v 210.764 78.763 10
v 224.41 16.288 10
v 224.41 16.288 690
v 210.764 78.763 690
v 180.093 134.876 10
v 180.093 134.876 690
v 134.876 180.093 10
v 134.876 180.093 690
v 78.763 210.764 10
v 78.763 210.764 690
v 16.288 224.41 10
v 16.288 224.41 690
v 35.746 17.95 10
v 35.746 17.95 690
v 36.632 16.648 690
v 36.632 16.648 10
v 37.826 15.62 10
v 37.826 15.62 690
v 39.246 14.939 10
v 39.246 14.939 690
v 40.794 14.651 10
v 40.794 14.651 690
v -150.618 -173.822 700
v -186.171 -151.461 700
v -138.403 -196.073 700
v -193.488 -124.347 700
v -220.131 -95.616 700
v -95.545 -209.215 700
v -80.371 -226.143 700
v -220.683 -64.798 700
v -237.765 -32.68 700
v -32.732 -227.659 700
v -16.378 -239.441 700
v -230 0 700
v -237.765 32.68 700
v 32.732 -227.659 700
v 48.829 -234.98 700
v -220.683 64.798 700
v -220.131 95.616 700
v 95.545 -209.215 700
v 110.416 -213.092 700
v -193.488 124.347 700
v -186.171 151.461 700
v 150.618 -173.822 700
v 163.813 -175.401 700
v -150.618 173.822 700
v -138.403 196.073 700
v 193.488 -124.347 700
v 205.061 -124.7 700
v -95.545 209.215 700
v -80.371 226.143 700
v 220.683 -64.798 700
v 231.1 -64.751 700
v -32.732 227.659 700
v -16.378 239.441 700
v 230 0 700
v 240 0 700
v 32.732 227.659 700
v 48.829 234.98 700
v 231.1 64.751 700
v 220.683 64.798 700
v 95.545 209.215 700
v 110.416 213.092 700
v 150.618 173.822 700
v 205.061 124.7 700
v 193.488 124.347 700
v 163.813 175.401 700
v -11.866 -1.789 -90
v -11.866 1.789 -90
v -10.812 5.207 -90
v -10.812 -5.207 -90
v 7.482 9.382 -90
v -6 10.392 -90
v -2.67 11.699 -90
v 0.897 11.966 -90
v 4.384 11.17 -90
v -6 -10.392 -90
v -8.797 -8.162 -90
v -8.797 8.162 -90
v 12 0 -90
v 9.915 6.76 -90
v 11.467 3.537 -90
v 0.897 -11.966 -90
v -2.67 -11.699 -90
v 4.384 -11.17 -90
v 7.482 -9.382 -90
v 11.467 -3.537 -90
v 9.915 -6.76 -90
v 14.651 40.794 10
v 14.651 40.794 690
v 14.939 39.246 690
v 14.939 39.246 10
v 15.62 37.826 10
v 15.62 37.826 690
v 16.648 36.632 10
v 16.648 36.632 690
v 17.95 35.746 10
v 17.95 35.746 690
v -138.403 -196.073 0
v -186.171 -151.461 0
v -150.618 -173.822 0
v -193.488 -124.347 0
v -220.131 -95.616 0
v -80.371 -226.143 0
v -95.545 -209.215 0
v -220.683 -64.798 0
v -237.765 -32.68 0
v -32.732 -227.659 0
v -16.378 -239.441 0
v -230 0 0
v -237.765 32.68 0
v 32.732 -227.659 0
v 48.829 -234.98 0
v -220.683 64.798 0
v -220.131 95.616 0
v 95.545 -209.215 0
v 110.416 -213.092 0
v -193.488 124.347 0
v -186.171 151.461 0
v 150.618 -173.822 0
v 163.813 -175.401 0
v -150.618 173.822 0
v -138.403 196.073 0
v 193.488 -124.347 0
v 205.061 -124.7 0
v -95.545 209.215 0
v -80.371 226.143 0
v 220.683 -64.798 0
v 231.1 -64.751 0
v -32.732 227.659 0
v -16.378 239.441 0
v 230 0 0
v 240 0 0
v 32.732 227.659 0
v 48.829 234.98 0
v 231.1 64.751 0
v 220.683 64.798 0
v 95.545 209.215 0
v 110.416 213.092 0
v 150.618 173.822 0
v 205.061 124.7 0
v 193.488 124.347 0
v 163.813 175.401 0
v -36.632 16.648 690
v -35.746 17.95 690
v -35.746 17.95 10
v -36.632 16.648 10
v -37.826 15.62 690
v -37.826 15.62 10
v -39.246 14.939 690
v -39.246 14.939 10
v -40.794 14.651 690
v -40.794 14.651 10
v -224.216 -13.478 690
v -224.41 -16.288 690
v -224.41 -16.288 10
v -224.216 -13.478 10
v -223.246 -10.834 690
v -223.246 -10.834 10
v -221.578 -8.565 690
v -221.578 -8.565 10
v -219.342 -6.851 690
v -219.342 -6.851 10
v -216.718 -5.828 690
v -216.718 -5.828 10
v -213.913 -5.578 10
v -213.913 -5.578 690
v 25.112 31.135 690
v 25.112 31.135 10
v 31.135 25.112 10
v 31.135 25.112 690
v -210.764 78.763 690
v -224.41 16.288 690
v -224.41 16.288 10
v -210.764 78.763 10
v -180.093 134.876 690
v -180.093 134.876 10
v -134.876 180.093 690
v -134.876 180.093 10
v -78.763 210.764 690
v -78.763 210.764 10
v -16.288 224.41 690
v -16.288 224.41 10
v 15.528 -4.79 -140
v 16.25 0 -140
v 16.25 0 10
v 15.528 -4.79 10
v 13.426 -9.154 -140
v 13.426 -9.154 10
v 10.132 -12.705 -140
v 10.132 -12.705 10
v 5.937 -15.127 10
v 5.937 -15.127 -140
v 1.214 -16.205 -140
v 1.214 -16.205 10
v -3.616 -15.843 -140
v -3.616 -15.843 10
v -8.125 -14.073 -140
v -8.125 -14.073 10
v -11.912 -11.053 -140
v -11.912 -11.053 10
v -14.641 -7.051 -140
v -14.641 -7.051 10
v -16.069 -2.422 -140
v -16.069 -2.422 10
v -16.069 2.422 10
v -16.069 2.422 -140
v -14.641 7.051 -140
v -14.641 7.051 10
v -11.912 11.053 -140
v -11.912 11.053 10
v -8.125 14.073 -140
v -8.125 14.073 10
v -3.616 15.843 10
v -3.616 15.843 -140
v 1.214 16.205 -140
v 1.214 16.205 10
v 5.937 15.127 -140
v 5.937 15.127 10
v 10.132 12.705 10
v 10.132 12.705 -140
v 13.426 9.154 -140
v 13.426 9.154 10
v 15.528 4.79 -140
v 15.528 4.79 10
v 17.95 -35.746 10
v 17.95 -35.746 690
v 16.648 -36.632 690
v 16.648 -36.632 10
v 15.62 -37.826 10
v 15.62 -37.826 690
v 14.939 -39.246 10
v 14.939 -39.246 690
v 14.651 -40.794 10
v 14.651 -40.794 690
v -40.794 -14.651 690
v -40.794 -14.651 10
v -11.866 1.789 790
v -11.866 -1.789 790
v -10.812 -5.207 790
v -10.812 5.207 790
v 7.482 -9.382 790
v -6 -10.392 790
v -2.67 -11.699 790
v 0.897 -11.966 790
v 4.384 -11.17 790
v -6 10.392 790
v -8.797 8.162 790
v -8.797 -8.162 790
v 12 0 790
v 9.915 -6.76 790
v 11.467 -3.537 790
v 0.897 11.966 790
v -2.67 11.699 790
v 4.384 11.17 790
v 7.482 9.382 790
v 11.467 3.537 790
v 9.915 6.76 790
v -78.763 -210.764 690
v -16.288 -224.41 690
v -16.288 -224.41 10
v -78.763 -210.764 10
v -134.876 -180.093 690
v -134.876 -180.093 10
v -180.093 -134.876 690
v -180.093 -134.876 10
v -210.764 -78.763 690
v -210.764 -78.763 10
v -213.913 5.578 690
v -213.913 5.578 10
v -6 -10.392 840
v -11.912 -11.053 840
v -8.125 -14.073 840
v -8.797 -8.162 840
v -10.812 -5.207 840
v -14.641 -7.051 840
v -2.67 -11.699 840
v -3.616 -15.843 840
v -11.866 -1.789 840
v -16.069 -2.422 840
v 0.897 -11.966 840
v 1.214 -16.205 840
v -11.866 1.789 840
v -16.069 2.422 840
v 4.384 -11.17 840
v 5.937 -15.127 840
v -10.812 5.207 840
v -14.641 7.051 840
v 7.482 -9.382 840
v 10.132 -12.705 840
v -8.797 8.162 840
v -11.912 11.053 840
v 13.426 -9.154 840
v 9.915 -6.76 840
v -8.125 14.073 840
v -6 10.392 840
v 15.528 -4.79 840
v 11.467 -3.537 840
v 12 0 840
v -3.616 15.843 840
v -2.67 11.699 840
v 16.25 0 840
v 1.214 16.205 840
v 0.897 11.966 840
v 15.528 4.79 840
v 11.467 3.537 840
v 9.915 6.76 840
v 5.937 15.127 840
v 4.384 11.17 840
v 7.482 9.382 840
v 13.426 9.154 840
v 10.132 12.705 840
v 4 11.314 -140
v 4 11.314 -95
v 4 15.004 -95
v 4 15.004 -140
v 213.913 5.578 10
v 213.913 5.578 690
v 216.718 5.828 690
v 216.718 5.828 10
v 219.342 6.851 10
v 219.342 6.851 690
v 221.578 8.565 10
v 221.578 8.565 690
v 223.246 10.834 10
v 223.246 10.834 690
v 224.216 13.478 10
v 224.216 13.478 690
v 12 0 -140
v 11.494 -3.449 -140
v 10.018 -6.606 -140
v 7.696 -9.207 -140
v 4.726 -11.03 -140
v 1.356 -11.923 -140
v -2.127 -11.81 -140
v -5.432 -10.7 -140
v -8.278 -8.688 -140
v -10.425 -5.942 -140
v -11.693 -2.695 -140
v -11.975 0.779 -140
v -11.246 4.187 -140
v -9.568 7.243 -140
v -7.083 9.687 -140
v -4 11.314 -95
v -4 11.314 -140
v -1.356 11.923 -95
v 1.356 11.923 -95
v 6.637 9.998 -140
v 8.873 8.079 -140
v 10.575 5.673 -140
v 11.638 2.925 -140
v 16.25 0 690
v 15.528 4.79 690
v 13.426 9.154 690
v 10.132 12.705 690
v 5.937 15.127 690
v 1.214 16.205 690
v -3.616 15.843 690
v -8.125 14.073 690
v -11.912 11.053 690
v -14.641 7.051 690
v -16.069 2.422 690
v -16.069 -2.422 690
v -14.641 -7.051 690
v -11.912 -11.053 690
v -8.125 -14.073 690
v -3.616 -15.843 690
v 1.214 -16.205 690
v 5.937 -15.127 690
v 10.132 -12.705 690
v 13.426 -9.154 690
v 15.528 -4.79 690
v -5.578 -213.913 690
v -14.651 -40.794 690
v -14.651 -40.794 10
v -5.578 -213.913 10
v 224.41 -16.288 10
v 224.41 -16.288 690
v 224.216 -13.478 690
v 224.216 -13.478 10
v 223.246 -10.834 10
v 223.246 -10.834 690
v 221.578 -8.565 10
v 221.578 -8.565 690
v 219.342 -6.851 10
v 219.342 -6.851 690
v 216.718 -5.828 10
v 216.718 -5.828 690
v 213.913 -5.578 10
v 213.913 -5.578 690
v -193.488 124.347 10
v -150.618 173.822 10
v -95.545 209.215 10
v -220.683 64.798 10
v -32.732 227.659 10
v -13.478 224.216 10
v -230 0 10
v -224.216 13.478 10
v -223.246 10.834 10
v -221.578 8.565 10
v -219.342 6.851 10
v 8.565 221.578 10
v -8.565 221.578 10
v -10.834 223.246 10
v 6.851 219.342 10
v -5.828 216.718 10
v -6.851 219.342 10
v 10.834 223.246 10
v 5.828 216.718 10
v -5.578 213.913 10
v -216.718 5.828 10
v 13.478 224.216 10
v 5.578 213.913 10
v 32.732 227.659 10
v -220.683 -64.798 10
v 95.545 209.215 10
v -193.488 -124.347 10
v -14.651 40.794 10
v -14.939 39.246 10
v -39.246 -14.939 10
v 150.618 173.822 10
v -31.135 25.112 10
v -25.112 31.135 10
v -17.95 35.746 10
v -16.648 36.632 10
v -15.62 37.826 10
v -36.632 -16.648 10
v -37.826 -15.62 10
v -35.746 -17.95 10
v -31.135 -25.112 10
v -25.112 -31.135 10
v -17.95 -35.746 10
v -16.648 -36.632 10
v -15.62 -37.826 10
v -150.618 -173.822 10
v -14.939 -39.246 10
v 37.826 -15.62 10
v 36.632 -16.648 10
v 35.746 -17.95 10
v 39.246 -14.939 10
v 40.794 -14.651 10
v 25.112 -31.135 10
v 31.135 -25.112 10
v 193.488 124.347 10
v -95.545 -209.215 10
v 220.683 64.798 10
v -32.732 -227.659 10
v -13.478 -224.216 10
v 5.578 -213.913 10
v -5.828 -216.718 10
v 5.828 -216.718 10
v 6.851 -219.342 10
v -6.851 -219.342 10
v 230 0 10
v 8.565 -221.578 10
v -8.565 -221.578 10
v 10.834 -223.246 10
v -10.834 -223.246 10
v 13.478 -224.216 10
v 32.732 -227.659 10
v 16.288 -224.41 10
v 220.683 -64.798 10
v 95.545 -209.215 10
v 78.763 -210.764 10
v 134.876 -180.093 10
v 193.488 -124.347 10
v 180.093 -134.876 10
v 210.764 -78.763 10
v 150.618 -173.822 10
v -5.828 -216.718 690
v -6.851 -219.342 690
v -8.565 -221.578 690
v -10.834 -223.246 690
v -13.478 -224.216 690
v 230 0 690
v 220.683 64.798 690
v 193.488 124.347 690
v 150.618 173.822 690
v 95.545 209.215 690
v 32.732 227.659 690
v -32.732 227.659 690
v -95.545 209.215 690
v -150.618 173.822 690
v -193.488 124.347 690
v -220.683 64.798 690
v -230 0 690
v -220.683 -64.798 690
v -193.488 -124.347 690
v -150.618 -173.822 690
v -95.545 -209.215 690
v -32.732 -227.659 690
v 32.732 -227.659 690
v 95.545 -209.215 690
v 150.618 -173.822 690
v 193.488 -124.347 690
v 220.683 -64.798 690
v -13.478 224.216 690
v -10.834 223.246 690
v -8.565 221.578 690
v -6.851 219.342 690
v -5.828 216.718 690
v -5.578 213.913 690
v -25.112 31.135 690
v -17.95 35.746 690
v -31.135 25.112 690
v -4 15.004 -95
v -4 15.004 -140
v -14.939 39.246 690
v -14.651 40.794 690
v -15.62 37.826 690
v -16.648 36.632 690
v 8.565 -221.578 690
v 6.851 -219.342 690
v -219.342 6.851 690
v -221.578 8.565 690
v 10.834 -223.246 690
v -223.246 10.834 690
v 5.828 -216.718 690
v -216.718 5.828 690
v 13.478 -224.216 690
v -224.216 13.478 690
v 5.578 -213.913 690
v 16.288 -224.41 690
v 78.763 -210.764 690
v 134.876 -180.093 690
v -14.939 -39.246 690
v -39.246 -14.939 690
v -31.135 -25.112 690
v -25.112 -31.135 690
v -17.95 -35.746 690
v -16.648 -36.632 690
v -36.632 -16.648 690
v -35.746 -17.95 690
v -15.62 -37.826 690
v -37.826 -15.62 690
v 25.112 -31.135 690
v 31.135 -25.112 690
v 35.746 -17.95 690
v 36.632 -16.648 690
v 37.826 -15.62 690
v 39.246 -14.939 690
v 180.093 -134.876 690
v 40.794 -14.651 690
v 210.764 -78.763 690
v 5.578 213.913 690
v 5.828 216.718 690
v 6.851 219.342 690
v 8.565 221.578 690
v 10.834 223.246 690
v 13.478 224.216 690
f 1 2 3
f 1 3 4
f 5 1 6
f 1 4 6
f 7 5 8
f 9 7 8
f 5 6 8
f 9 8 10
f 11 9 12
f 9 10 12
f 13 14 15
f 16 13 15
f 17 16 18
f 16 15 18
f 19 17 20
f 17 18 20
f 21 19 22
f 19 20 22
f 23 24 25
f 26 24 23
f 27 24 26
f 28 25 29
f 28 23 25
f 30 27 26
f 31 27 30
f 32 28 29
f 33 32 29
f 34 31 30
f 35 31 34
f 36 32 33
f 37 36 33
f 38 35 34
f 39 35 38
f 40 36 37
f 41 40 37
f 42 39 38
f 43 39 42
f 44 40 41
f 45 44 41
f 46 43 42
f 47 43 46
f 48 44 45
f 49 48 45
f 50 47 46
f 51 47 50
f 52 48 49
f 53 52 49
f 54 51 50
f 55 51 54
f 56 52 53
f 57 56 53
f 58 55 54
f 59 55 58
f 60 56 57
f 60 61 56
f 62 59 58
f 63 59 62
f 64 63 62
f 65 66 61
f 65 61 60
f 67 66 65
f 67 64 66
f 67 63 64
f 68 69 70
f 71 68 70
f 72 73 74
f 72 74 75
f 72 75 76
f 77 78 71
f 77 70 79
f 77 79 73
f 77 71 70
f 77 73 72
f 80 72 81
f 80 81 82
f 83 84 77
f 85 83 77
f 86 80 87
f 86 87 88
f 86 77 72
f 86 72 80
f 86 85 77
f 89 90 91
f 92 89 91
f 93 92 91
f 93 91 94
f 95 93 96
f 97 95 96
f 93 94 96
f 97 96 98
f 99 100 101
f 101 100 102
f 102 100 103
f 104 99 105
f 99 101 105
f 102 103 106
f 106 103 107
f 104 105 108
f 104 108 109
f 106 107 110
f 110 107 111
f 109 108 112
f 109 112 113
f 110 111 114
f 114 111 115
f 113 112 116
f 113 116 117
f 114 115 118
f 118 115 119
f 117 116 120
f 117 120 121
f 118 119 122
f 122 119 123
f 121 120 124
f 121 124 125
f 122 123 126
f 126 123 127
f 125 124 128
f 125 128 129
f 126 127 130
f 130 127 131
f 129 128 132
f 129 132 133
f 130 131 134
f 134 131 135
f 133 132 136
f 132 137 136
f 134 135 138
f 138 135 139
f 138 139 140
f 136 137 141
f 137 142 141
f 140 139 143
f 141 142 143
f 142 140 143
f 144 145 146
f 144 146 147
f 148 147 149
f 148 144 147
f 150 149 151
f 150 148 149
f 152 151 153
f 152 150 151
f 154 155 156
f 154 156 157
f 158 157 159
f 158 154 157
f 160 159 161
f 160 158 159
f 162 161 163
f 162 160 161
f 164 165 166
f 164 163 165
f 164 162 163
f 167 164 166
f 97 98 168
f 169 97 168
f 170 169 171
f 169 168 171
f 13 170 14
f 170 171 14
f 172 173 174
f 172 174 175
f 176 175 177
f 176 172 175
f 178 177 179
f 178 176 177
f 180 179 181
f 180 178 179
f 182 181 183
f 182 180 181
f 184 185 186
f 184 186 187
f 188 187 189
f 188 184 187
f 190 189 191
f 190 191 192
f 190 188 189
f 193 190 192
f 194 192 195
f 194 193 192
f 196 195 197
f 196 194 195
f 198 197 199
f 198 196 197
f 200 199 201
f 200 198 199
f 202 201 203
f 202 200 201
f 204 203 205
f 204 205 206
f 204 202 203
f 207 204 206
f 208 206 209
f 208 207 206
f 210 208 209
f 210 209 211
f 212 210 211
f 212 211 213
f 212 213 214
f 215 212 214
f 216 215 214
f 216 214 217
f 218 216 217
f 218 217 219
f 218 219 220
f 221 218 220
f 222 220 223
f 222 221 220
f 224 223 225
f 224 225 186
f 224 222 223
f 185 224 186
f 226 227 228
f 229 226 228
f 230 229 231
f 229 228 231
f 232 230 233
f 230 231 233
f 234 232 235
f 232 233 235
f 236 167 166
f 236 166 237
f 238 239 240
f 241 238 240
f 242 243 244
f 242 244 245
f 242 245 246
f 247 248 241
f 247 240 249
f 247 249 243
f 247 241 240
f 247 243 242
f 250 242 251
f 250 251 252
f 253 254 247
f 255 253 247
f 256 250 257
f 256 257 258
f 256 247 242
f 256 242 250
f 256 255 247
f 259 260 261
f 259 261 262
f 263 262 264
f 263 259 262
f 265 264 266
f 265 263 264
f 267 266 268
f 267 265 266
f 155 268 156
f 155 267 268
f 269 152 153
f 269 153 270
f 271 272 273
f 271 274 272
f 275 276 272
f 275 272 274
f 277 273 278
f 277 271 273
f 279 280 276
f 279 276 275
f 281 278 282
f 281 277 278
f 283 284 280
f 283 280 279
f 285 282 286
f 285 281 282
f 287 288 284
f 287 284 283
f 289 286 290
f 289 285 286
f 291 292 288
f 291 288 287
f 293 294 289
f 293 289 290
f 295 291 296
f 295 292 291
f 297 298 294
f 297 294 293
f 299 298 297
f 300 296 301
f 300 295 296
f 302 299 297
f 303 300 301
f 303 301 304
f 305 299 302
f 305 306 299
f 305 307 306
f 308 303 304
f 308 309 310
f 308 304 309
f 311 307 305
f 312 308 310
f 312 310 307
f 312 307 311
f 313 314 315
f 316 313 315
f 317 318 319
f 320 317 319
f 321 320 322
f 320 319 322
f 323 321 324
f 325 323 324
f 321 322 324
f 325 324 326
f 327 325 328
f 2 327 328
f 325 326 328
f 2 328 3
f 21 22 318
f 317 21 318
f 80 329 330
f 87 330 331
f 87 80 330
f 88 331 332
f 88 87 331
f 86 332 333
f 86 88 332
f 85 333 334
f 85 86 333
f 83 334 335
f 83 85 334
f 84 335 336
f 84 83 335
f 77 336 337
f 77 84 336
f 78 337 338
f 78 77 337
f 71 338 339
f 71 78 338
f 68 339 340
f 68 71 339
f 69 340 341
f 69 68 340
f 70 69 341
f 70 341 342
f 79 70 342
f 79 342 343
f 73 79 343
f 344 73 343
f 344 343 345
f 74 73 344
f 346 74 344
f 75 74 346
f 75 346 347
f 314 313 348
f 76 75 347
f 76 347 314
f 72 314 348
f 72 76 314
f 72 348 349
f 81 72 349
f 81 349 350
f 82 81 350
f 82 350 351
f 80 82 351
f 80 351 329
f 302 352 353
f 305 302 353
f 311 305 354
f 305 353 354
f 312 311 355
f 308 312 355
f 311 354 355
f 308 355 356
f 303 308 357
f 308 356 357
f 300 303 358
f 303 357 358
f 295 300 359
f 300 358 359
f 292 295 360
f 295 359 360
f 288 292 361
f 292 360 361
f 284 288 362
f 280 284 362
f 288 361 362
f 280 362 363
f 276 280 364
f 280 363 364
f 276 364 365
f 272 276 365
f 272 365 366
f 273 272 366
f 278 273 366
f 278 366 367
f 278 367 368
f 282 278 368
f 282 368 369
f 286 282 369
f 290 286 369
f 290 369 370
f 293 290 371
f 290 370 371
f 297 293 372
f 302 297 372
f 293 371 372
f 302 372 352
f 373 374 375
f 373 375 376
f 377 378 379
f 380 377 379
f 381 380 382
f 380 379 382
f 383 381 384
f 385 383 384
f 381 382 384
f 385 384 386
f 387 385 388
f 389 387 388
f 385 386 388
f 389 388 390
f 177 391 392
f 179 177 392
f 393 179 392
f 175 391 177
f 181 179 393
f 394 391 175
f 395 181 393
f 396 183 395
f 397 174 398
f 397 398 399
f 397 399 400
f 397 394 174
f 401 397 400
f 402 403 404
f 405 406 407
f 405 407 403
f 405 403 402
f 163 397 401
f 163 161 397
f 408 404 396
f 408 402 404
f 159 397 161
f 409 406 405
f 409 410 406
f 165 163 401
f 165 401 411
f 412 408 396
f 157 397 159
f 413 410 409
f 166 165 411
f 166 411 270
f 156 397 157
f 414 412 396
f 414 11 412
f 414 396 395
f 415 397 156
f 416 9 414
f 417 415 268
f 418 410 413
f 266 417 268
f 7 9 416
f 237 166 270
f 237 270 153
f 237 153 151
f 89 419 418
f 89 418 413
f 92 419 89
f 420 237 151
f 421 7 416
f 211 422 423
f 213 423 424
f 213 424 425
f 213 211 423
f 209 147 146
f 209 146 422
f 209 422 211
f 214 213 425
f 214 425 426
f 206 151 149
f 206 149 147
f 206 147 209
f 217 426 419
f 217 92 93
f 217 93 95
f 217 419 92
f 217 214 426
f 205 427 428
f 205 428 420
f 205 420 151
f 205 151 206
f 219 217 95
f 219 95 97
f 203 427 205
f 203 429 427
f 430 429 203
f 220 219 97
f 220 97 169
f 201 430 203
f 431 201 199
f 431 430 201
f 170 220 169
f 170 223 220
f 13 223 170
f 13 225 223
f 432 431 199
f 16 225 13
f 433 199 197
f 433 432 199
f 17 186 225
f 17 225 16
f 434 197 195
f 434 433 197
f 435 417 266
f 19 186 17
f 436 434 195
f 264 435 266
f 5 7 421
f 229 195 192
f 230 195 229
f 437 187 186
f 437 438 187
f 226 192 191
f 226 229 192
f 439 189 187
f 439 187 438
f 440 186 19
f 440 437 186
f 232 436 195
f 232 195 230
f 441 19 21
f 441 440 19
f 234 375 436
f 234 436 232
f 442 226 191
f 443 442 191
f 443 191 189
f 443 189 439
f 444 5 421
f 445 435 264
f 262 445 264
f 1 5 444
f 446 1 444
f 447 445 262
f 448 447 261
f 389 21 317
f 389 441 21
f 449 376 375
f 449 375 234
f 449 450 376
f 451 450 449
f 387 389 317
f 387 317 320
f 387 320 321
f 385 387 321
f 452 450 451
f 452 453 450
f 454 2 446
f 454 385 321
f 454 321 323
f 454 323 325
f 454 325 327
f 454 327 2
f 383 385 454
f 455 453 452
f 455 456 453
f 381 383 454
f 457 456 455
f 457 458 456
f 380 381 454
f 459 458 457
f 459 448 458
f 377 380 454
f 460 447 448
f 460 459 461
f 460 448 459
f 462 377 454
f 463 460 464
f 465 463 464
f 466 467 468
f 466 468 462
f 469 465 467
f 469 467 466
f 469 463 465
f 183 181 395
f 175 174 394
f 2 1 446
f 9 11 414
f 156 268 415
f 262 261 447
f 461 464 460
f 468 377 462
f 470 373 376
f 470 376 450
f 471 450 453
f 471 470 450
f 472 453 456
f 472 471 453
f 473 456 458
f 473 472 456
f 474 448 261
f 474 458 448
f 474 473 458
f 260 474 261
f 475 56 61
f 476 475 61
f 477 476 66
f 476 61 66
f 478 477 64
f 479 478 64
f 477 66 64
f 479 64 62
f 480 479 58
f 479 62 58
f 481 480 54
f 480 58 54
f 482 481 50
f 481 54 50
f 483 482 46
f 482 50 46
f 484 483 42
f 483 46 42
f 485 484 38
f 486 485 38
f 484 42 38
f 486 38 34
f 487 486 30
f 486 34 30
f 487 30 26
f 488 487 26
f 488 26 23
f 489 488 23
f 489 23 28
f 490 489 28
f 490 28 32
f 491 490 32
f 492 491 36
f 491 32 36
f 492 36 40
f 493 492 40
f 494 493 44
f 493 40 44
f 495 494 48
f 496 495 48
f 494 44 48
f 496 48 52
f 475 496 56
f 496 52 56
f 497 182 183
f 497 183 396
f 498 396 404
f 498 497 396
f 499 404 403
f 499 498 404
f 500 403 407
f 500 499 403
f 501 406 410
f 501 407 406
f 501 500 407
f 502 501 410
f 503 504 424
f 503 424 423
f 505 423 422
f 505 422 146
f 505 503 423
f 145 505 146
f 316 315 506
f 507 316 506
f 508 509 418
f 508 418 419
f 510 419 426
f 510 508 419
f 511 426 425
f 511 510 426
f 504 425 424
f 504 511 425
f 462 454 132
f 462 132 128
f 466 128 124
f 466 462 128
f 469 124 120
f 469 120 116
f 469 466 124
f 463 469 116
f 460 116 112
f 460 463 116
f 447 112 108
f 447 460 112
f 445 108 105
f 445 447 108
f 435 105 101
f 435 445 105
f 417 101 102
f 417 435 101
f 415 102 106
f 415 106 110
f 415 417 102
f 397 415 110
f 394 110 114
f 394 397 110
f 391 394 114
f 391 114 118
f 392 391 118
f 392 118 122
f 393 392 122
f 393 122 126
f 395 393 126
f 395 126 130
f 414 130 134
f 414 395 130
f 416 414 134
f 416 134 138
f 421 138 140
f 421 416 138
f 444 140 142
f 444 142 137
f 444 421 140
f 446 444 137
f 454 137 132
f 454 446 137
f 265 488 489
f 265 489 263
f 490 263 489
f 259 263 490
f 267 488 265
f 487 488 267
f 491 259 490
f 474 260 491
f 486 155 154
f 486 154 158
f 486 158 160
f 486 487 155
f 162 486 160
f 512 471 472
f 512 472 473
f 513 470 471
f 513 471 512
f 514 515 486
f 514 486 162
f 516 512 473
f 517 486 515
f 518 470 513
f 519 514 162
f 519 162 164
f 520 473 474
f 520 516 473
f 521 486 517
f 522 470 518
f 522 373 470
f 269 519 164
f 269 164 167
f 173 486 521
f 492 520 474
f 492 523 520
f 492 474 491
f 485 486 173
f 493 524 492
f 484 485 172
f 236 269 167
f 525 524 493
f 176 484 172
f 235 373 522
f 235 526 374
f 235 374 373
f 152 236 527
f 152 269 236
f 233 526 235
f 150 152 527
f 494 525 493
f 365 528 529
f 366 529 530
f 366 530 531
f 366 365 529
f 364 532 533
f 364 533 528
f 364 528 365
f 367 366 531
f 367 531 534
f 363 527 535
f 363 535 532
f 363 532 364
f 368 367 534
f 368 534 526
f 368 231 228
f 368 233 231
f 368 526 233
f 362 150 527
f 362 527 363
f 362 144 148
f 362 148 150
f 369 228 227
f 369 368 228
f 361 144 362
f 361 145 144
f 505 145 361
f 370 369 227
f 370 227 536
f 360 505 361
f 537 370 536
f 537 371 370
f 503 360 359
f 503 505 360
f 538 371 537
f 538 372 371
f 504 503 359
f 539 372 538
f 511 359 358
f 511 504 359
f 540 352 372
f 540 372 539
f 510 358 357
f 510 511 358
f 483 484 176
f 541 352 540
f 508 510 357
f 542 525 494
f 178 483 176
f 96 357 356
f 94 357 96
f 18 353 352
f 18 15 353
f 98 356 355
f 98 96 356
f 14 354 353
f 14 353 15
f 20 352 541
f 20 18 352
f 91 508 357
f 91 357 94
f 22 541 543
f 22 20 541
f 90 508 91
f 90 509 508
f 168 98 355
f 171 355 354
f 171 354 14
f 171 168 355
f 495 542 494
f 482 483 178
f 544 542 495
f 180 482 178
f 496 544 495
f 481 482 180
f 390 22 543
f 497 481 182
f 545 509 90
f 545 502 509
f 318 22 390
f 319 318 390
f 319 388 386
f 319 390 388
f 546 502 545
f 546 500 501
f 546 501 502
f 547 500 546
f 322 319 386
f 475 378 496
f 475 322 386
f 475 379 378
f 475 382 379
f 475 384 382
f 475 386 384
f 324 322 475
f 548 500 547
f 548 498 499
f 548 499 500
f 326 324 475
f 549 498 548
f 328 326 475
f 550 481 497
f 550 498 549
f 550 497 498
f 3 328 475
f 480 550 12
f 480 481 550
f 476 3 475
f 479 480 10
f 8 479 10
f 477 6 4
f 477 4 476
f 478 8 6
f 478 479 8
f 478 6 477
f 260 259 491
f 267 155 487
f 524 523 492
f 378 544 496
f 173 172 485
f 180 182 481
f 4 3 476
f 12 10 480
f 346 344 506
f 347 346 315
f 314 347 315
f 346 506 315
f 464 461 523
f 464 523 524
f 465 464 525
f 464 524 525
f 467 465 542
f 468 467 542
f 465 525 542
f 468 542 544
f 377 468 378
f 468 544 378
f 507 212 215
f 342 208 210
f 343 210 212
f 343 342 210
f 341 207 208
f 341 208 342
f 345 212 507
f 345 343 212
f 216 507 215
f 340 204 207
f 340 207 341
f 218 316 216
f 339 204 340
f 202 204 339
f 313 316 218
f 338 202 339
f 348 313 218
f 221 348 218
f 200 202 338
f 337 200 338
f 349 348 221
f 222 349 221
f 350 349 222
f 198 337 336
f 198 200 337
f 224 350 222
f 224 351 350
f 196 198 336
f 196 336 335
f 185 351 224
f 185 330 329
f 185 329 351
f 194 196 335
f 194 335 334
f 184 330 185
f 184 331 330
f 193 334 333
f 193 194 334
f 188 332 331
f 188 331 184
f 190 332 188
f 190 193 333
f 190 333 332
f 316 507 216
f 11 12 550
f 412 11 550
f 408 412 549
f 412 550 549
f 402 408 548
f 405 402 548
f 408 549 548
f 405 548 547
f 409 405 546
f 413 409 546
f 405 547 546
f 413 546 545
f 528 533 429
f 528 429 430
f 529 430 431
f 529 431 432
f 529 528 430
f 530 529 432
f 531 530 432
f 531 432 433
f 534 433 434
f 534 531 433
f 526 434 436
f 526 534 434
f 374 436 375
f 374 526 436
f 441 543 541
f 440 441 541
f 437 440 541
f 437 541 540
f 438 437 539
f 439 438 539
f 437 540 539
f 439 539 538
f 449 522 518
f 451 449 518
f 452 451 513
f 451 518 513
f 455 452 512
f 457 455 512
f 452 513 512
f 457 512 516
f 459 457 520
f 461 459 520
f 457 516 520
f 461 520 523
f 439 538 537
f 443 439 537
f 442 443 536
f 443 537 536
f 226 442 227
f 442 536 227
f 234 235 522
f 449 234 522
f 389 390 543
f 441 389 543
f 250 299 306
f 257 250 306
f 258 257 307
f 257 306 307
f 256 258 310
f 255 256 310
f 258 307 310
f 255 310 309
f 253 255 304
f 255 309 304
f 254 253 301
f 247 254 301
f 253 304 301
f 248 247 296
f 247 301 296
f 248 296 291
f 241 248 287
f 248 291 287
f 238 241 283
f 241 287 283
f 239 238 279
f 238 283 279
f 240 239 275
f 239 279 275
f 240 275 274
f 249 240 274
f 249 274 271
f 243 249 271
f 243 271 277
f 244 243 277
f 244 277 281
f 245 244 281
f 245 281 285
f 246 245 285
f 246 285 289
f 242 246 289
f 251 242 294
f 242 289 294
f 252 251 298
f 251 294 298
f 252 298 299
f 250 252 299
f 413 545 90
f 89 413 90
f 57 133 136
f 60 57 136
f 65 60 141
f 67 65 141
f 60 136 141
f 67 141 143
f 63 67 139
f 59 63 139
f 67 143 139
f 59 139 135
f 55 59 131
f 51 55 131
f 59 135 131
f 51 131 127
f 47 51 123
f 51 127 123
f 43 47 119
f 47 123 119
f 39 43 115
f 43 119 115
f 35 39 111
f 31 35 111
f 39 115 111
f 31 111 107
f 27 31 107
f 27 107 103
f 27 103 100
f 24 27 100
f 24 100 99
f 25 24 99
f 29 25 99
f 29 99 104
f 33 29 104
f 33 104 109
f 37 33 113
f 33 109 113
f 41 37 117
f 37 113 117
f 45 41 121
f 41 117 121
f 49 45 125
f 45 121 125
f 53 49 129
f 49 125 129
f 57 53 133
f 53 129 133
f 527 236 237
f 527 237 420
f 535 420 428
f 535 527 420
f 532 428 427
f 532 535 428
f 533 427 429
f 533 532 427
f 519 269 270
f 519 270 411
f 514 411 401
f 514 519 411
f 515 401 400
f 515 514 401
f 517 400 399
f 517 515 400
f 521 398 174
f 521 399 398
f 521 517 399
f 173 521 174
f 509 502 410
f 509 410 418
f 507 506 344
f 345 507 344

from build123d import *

# Parameters (mm, degrees)
SKETCH1_R           = 240
BOSS_EXTRUDE1_DEPTH = 700
SKETCH2_R           = 230
CUT_EXTRUDE1_DEPTH  = 10
CUT_EXTRUDE2_START  = -10
SKETCH3_R           = 230
CUT_EXTRUDE2_DEPTH  = 10
CUT_EXTRUDE3_REACH  = 770.96
SKETCH5_R           = 16.25
BOSS_EXTRUDE2_DEPTH = 150
BOSS_EXTRUDE3_START = 150
SKETCH6_R           = 16.25
BOSS_EXTRUDE3_DEPTH = 150
SKETCH7_R           = 12
CUT_EXTRUDE4_DEPTH  = 50
CUT_EXTRUDE5_START  = -50
SKETCH8_R           = 12
CUT_EXTRUDE5_DEPTH  = 50
CUT_EXTRUDE8_START  = -45
CUT_EXTRUDE8_DEPTH  = 45


with BuildPart() as part:
    # Sketch1 → Boss-Extrude1 (new body)
    with BuildSketch(Plane.XY):
        Circle(SKETCH1_R)
    extrude(amount=BOSS_EXTRUDE1_DEPTH)

    # Sketch2 → Cut-Extrude1 (cut)
    with BuildSketch(Plane.XY.offset(700)):
        Circle(SKETCH2_R)
    extrude(amount=-CUT_EXTRUDE1_DEPTH, mode=Mode.SUBTRACT)

    # Sketch3 → Cut-Extrude2 (cut)
    with BuildSketch(Plane(origin=(0, 0, 0), x_dir=(-1, 0, 0), z_dir=(0, 0, -1)).offset(CUT_EXTRUDE2_START)):
        with Locations(Location((0, 0, 0), (0, 0, 180))):
            Circle(SKETCH3_R)
    extrude(amount=CUT_EXTRUDE2_DEPTH, mode=Mode.SUBTRACT)

    # Sketch4 → Cut-Extrude3 (cut, up to next)
    with BuildSketch(Plane.XY.offset(690), mode=Mode.PRIVATE) as cut_extrude3_sk1:
        with BuildLine():
            Line((-5.578158138, 213.912523134), (-14.650908758, 40.79412842))
            ThreePointArc((-14.650908758, 40.79412842), (-15.620272478, 37.825559391), (-17.95016171, 35.746212311))
            ThreePointArc((-17.95016171, 35.746212311), (-28.284271247, 28.284271247), (-35.746212311, 17.95016171))
            ThreePointArc((-35.746212311, 17.95016171), (-37.825559391, 15.620272478), (-40.79412842, 14.650908758))
            Line((-40.79412842, 14.650908758), (-213.912523134, 5.578158138))
            ThreePointArc((-213.912523134, 5.578158138), (-221.577643537, 8.564792629), (-224.409644682, 16.288381554))
            ThreePointArc((-224.409644682, 16.288381554), (-159.099025767, 159.099025767), (-16.288381554, 224.409644682))
            ThreePointArc((-16.288381554, 224.409644682), (-8.564792629, 221.577643537), (-5.578158138, 213.912523134))
        make_face()
    cut_extrude3_tool1 = extrude(cut_extrude3_sk1.sketch, amount=-CUT_EXTRUDE3_REACH, mode=Mode.PRIVATE) & part.part
    # Sketch4 → Cut-Extrude3 (cut, up to next)
    with BuildSketch(Plane.XY.offset(690), mode=Mode.PRIVATE) as cut_extrude3_sk2:
        with BuildLine():
            Line((5.578158138, 213.912523134), (14.650908758, 40.79412842))
            ThreePointArc((14.650908758, 40.79412842), (15.620272478, 37.825559391), (17.95016171, 35.746212311))
            ThreePointArc((17.95016171, 35.746212311), (28.284271247, 28.284271247), (35.746212311, 17.95016171))
            ThreePointArc((35.746212311, 17.95016171), (37.825559391, 15.620272478), (40.79412842, 14.650908758))
            Line((40.79412842, 14.650908758), (213.912523134, 5.578158138))
            ThreePointArc((213.912523134, 5.578158138), (221.577643537, 8.564792629), (224.409644682, 16.288381554))
            ThreePointArc((224.409644682, 16.288381554), (159.099025767, 159.099025767), (16.288381554, 224.409644682))
            ThreePointArc((16.288381554, 224.409644682), (8.564792629, 221.577643537), (5.578158138, 213.912523134))
        make_face()
    cut_extrude3_tool2 = extrude(cut_extrude3_sk2.sketch, amount=-CUT_EXTRUDE3_REACH, mode=Mode.PRIVATE) & part.part
    # Sketch4 → Cut-Extrude3 (cut, up to next)
    with BuildSketch(Plane.XY.offset(690), mode=Mode.PRIVATE) as cut_extrude3_sk3:
        with BuildLine():
            Line((-213.912523134, -5.578158138), (-40.79412842, -14.650908758))
            ThreePointArc((-40.79412842, -14.650908758), (-37.825559391, -15.620272478), (-35.746212311, -17.95016171))
            ThreePointArc((-35.746212311, -17.95016171), (-28.284271247, -28.284271247), (-17.95016171, -35.746212311))
            ThreePointArc((-17.95016171, -35.746212311), (-15.620272478, -37.825559391), (-14.650908758, -40.79412842))
            Line((-14.650908758, -40.79412842), (-5.578158138, -213.912523134))
            ThreePointArc((-5.578158138, -213.912523134), (-8.564792629, -221.577643537), (-16.288381554, -224.409644682))
            ThreePointArc((-16.288381554, -224.409644682), (-159.099025767, -159.099025767), (-224.409644682, -16.288381554))
            ThreePointArc((-224.409644682, -16.288381554), (-221.577643537, -8.564792629), (-213.912523134, -5.578158138))
        make_face()
    cut_extrude3_tool3 = extrude(cut_extrude3_sk3.sketch, amount=-CUT_EXTRUDE3_REACH, mode=Mode.PRIVATE) & part.part
    # Sketch4 → Cut-Extrude3 (cut, up to next)
    with BuildSketch(Plane.XY.offset(690), mode=Mode.PRIVATE) as cut_extrude3_sk4:
        with BuildLine():
            Line((213.912523134, -5.578158138), (40.79412842, -14.650908758))
            ThreePointArc((40.79412842, -14.650908758), (37.825559391, -15.620272478), (35.746212311, -17.95016171))
            ThreePointArc((35.746212311, -17.95016171), (28.284271247, -28.284271247), (17.95016171, -35.746212311))
            ThreePointArc((17.95016171, -35.746212311), (15.620272478, -37.825559391), (14.650908758, -40.79412842))
            Line((14.650908758, -40.79412842), (5.578158138, -213.912523134))
            ThreePointArc((5.578158138, -213.912523134), (8.564792629, -221.577643537), (16.288381554, -224.409644682))
            ThreePointArc((16.288381554, -224.409644682), (159.099025767, -159.099025767), (224.409644682, -16.288381554))
            ThreePointArc((224.409644682, -16.288381554), (221.577643537, -8.564792629), (213.912523134, -5.578158138))
        make_face()
    cut_extrude3_tool4 = extrude(cut_extrude3_sk4.sketch, amount=-CUT_EXTRUDE3_REACH, mode=Mode.PRIVATE) & part.part
    add(cut_extrude3_tool1.solids().sort_by_distance((-101.943067, 101.943067, 690))[0], mode=Mode.SUBTRACT)
    add(cut_extrude3_tool2.solids().sort_by_distance((101.943067, 101.943067, 690))[0], mode=Mode.SUBTRACT)
    add(cut_extrude3_tool3.solids().sort_by_distance((-101.943067, -101.943067, 690))[0], mode=Mode.SUBTRACT)
    add(cut_extrude3_tool4.solids().sort_by_distance((101.943067, -101.943067, 690))[0], mode=Mode.SUBTRACT)

    # Sketch5 → Boss-Extrude2 (add)
    with BuildSketch(Plane.XY.offset(690)):
        Circle(SKETCH5_R)
    extrude(amount=BOSS_EXTRUDE2_DEPTH)

    # Sketch6 → Boss-Extrude3 (add)
    with BuildSketch(Plane(origin=(0, 0, 10), x_dir=(-1, 0, 0), z_dir=(0, 0, -1)).offset(BOSS_EXTRUDE3_START)):
        with Locations(Location((0, 0, 0), (0, 0, 180))):
            Circle(SKETCH6_R)
    extrude(amount=-BOSS_EXTRUDE3_DEPTH)

    # Sketch7 → Cut-Extrude4 (cut)
    with BuildSketch(Plane.XY.offset(840)):
        Circle(SKETCH7_R)
    extrude(amount=-CUT_EXTRUDE4_DEPTH, mode=Mode.SUBTRACT)

    # Sketch8 → Cut-Extrude5 (cut)
    with BuildSketch(Plane(origin=(0, 0, -140), x_dir=(-1, 0, 0), z_dir=(0, 0, -1)).offset(CUT_EXTRUDE5_START)):
        with Locations(Location((0, 0, 0), (0, 0, 180))):
            Circle(SKETCH8_R)
    extrude(amount=CUT_EXTRUDE5_DEPTH, mode=Mode.SUBTRACT)

    # Sketch10 → Cut-Extrude8 (cut)
    with BuildSketch(Plane(origin=(0, 0, -140), x_dir=(-1, 0, 0), z_dir=(0, 0, -1)).offset(CUT_EXTRUDE8_START)):
        with BuildLine():
            Line((-4, 11.313708499), (-4, 15.003708499))
            Line((-4, 15.003708499), (4, 15.003708499))
            Line((4, 15.003708499), (4, 11.313708499))
            ThreePointArc((4, 11.313708499), (0, 12), (-4, 11.313708499))
        make_face()
    extrude(amount=CUT_EXTRUDE8_DEPTH, mode=Mode.SUBTRACT)


solid = part.part
